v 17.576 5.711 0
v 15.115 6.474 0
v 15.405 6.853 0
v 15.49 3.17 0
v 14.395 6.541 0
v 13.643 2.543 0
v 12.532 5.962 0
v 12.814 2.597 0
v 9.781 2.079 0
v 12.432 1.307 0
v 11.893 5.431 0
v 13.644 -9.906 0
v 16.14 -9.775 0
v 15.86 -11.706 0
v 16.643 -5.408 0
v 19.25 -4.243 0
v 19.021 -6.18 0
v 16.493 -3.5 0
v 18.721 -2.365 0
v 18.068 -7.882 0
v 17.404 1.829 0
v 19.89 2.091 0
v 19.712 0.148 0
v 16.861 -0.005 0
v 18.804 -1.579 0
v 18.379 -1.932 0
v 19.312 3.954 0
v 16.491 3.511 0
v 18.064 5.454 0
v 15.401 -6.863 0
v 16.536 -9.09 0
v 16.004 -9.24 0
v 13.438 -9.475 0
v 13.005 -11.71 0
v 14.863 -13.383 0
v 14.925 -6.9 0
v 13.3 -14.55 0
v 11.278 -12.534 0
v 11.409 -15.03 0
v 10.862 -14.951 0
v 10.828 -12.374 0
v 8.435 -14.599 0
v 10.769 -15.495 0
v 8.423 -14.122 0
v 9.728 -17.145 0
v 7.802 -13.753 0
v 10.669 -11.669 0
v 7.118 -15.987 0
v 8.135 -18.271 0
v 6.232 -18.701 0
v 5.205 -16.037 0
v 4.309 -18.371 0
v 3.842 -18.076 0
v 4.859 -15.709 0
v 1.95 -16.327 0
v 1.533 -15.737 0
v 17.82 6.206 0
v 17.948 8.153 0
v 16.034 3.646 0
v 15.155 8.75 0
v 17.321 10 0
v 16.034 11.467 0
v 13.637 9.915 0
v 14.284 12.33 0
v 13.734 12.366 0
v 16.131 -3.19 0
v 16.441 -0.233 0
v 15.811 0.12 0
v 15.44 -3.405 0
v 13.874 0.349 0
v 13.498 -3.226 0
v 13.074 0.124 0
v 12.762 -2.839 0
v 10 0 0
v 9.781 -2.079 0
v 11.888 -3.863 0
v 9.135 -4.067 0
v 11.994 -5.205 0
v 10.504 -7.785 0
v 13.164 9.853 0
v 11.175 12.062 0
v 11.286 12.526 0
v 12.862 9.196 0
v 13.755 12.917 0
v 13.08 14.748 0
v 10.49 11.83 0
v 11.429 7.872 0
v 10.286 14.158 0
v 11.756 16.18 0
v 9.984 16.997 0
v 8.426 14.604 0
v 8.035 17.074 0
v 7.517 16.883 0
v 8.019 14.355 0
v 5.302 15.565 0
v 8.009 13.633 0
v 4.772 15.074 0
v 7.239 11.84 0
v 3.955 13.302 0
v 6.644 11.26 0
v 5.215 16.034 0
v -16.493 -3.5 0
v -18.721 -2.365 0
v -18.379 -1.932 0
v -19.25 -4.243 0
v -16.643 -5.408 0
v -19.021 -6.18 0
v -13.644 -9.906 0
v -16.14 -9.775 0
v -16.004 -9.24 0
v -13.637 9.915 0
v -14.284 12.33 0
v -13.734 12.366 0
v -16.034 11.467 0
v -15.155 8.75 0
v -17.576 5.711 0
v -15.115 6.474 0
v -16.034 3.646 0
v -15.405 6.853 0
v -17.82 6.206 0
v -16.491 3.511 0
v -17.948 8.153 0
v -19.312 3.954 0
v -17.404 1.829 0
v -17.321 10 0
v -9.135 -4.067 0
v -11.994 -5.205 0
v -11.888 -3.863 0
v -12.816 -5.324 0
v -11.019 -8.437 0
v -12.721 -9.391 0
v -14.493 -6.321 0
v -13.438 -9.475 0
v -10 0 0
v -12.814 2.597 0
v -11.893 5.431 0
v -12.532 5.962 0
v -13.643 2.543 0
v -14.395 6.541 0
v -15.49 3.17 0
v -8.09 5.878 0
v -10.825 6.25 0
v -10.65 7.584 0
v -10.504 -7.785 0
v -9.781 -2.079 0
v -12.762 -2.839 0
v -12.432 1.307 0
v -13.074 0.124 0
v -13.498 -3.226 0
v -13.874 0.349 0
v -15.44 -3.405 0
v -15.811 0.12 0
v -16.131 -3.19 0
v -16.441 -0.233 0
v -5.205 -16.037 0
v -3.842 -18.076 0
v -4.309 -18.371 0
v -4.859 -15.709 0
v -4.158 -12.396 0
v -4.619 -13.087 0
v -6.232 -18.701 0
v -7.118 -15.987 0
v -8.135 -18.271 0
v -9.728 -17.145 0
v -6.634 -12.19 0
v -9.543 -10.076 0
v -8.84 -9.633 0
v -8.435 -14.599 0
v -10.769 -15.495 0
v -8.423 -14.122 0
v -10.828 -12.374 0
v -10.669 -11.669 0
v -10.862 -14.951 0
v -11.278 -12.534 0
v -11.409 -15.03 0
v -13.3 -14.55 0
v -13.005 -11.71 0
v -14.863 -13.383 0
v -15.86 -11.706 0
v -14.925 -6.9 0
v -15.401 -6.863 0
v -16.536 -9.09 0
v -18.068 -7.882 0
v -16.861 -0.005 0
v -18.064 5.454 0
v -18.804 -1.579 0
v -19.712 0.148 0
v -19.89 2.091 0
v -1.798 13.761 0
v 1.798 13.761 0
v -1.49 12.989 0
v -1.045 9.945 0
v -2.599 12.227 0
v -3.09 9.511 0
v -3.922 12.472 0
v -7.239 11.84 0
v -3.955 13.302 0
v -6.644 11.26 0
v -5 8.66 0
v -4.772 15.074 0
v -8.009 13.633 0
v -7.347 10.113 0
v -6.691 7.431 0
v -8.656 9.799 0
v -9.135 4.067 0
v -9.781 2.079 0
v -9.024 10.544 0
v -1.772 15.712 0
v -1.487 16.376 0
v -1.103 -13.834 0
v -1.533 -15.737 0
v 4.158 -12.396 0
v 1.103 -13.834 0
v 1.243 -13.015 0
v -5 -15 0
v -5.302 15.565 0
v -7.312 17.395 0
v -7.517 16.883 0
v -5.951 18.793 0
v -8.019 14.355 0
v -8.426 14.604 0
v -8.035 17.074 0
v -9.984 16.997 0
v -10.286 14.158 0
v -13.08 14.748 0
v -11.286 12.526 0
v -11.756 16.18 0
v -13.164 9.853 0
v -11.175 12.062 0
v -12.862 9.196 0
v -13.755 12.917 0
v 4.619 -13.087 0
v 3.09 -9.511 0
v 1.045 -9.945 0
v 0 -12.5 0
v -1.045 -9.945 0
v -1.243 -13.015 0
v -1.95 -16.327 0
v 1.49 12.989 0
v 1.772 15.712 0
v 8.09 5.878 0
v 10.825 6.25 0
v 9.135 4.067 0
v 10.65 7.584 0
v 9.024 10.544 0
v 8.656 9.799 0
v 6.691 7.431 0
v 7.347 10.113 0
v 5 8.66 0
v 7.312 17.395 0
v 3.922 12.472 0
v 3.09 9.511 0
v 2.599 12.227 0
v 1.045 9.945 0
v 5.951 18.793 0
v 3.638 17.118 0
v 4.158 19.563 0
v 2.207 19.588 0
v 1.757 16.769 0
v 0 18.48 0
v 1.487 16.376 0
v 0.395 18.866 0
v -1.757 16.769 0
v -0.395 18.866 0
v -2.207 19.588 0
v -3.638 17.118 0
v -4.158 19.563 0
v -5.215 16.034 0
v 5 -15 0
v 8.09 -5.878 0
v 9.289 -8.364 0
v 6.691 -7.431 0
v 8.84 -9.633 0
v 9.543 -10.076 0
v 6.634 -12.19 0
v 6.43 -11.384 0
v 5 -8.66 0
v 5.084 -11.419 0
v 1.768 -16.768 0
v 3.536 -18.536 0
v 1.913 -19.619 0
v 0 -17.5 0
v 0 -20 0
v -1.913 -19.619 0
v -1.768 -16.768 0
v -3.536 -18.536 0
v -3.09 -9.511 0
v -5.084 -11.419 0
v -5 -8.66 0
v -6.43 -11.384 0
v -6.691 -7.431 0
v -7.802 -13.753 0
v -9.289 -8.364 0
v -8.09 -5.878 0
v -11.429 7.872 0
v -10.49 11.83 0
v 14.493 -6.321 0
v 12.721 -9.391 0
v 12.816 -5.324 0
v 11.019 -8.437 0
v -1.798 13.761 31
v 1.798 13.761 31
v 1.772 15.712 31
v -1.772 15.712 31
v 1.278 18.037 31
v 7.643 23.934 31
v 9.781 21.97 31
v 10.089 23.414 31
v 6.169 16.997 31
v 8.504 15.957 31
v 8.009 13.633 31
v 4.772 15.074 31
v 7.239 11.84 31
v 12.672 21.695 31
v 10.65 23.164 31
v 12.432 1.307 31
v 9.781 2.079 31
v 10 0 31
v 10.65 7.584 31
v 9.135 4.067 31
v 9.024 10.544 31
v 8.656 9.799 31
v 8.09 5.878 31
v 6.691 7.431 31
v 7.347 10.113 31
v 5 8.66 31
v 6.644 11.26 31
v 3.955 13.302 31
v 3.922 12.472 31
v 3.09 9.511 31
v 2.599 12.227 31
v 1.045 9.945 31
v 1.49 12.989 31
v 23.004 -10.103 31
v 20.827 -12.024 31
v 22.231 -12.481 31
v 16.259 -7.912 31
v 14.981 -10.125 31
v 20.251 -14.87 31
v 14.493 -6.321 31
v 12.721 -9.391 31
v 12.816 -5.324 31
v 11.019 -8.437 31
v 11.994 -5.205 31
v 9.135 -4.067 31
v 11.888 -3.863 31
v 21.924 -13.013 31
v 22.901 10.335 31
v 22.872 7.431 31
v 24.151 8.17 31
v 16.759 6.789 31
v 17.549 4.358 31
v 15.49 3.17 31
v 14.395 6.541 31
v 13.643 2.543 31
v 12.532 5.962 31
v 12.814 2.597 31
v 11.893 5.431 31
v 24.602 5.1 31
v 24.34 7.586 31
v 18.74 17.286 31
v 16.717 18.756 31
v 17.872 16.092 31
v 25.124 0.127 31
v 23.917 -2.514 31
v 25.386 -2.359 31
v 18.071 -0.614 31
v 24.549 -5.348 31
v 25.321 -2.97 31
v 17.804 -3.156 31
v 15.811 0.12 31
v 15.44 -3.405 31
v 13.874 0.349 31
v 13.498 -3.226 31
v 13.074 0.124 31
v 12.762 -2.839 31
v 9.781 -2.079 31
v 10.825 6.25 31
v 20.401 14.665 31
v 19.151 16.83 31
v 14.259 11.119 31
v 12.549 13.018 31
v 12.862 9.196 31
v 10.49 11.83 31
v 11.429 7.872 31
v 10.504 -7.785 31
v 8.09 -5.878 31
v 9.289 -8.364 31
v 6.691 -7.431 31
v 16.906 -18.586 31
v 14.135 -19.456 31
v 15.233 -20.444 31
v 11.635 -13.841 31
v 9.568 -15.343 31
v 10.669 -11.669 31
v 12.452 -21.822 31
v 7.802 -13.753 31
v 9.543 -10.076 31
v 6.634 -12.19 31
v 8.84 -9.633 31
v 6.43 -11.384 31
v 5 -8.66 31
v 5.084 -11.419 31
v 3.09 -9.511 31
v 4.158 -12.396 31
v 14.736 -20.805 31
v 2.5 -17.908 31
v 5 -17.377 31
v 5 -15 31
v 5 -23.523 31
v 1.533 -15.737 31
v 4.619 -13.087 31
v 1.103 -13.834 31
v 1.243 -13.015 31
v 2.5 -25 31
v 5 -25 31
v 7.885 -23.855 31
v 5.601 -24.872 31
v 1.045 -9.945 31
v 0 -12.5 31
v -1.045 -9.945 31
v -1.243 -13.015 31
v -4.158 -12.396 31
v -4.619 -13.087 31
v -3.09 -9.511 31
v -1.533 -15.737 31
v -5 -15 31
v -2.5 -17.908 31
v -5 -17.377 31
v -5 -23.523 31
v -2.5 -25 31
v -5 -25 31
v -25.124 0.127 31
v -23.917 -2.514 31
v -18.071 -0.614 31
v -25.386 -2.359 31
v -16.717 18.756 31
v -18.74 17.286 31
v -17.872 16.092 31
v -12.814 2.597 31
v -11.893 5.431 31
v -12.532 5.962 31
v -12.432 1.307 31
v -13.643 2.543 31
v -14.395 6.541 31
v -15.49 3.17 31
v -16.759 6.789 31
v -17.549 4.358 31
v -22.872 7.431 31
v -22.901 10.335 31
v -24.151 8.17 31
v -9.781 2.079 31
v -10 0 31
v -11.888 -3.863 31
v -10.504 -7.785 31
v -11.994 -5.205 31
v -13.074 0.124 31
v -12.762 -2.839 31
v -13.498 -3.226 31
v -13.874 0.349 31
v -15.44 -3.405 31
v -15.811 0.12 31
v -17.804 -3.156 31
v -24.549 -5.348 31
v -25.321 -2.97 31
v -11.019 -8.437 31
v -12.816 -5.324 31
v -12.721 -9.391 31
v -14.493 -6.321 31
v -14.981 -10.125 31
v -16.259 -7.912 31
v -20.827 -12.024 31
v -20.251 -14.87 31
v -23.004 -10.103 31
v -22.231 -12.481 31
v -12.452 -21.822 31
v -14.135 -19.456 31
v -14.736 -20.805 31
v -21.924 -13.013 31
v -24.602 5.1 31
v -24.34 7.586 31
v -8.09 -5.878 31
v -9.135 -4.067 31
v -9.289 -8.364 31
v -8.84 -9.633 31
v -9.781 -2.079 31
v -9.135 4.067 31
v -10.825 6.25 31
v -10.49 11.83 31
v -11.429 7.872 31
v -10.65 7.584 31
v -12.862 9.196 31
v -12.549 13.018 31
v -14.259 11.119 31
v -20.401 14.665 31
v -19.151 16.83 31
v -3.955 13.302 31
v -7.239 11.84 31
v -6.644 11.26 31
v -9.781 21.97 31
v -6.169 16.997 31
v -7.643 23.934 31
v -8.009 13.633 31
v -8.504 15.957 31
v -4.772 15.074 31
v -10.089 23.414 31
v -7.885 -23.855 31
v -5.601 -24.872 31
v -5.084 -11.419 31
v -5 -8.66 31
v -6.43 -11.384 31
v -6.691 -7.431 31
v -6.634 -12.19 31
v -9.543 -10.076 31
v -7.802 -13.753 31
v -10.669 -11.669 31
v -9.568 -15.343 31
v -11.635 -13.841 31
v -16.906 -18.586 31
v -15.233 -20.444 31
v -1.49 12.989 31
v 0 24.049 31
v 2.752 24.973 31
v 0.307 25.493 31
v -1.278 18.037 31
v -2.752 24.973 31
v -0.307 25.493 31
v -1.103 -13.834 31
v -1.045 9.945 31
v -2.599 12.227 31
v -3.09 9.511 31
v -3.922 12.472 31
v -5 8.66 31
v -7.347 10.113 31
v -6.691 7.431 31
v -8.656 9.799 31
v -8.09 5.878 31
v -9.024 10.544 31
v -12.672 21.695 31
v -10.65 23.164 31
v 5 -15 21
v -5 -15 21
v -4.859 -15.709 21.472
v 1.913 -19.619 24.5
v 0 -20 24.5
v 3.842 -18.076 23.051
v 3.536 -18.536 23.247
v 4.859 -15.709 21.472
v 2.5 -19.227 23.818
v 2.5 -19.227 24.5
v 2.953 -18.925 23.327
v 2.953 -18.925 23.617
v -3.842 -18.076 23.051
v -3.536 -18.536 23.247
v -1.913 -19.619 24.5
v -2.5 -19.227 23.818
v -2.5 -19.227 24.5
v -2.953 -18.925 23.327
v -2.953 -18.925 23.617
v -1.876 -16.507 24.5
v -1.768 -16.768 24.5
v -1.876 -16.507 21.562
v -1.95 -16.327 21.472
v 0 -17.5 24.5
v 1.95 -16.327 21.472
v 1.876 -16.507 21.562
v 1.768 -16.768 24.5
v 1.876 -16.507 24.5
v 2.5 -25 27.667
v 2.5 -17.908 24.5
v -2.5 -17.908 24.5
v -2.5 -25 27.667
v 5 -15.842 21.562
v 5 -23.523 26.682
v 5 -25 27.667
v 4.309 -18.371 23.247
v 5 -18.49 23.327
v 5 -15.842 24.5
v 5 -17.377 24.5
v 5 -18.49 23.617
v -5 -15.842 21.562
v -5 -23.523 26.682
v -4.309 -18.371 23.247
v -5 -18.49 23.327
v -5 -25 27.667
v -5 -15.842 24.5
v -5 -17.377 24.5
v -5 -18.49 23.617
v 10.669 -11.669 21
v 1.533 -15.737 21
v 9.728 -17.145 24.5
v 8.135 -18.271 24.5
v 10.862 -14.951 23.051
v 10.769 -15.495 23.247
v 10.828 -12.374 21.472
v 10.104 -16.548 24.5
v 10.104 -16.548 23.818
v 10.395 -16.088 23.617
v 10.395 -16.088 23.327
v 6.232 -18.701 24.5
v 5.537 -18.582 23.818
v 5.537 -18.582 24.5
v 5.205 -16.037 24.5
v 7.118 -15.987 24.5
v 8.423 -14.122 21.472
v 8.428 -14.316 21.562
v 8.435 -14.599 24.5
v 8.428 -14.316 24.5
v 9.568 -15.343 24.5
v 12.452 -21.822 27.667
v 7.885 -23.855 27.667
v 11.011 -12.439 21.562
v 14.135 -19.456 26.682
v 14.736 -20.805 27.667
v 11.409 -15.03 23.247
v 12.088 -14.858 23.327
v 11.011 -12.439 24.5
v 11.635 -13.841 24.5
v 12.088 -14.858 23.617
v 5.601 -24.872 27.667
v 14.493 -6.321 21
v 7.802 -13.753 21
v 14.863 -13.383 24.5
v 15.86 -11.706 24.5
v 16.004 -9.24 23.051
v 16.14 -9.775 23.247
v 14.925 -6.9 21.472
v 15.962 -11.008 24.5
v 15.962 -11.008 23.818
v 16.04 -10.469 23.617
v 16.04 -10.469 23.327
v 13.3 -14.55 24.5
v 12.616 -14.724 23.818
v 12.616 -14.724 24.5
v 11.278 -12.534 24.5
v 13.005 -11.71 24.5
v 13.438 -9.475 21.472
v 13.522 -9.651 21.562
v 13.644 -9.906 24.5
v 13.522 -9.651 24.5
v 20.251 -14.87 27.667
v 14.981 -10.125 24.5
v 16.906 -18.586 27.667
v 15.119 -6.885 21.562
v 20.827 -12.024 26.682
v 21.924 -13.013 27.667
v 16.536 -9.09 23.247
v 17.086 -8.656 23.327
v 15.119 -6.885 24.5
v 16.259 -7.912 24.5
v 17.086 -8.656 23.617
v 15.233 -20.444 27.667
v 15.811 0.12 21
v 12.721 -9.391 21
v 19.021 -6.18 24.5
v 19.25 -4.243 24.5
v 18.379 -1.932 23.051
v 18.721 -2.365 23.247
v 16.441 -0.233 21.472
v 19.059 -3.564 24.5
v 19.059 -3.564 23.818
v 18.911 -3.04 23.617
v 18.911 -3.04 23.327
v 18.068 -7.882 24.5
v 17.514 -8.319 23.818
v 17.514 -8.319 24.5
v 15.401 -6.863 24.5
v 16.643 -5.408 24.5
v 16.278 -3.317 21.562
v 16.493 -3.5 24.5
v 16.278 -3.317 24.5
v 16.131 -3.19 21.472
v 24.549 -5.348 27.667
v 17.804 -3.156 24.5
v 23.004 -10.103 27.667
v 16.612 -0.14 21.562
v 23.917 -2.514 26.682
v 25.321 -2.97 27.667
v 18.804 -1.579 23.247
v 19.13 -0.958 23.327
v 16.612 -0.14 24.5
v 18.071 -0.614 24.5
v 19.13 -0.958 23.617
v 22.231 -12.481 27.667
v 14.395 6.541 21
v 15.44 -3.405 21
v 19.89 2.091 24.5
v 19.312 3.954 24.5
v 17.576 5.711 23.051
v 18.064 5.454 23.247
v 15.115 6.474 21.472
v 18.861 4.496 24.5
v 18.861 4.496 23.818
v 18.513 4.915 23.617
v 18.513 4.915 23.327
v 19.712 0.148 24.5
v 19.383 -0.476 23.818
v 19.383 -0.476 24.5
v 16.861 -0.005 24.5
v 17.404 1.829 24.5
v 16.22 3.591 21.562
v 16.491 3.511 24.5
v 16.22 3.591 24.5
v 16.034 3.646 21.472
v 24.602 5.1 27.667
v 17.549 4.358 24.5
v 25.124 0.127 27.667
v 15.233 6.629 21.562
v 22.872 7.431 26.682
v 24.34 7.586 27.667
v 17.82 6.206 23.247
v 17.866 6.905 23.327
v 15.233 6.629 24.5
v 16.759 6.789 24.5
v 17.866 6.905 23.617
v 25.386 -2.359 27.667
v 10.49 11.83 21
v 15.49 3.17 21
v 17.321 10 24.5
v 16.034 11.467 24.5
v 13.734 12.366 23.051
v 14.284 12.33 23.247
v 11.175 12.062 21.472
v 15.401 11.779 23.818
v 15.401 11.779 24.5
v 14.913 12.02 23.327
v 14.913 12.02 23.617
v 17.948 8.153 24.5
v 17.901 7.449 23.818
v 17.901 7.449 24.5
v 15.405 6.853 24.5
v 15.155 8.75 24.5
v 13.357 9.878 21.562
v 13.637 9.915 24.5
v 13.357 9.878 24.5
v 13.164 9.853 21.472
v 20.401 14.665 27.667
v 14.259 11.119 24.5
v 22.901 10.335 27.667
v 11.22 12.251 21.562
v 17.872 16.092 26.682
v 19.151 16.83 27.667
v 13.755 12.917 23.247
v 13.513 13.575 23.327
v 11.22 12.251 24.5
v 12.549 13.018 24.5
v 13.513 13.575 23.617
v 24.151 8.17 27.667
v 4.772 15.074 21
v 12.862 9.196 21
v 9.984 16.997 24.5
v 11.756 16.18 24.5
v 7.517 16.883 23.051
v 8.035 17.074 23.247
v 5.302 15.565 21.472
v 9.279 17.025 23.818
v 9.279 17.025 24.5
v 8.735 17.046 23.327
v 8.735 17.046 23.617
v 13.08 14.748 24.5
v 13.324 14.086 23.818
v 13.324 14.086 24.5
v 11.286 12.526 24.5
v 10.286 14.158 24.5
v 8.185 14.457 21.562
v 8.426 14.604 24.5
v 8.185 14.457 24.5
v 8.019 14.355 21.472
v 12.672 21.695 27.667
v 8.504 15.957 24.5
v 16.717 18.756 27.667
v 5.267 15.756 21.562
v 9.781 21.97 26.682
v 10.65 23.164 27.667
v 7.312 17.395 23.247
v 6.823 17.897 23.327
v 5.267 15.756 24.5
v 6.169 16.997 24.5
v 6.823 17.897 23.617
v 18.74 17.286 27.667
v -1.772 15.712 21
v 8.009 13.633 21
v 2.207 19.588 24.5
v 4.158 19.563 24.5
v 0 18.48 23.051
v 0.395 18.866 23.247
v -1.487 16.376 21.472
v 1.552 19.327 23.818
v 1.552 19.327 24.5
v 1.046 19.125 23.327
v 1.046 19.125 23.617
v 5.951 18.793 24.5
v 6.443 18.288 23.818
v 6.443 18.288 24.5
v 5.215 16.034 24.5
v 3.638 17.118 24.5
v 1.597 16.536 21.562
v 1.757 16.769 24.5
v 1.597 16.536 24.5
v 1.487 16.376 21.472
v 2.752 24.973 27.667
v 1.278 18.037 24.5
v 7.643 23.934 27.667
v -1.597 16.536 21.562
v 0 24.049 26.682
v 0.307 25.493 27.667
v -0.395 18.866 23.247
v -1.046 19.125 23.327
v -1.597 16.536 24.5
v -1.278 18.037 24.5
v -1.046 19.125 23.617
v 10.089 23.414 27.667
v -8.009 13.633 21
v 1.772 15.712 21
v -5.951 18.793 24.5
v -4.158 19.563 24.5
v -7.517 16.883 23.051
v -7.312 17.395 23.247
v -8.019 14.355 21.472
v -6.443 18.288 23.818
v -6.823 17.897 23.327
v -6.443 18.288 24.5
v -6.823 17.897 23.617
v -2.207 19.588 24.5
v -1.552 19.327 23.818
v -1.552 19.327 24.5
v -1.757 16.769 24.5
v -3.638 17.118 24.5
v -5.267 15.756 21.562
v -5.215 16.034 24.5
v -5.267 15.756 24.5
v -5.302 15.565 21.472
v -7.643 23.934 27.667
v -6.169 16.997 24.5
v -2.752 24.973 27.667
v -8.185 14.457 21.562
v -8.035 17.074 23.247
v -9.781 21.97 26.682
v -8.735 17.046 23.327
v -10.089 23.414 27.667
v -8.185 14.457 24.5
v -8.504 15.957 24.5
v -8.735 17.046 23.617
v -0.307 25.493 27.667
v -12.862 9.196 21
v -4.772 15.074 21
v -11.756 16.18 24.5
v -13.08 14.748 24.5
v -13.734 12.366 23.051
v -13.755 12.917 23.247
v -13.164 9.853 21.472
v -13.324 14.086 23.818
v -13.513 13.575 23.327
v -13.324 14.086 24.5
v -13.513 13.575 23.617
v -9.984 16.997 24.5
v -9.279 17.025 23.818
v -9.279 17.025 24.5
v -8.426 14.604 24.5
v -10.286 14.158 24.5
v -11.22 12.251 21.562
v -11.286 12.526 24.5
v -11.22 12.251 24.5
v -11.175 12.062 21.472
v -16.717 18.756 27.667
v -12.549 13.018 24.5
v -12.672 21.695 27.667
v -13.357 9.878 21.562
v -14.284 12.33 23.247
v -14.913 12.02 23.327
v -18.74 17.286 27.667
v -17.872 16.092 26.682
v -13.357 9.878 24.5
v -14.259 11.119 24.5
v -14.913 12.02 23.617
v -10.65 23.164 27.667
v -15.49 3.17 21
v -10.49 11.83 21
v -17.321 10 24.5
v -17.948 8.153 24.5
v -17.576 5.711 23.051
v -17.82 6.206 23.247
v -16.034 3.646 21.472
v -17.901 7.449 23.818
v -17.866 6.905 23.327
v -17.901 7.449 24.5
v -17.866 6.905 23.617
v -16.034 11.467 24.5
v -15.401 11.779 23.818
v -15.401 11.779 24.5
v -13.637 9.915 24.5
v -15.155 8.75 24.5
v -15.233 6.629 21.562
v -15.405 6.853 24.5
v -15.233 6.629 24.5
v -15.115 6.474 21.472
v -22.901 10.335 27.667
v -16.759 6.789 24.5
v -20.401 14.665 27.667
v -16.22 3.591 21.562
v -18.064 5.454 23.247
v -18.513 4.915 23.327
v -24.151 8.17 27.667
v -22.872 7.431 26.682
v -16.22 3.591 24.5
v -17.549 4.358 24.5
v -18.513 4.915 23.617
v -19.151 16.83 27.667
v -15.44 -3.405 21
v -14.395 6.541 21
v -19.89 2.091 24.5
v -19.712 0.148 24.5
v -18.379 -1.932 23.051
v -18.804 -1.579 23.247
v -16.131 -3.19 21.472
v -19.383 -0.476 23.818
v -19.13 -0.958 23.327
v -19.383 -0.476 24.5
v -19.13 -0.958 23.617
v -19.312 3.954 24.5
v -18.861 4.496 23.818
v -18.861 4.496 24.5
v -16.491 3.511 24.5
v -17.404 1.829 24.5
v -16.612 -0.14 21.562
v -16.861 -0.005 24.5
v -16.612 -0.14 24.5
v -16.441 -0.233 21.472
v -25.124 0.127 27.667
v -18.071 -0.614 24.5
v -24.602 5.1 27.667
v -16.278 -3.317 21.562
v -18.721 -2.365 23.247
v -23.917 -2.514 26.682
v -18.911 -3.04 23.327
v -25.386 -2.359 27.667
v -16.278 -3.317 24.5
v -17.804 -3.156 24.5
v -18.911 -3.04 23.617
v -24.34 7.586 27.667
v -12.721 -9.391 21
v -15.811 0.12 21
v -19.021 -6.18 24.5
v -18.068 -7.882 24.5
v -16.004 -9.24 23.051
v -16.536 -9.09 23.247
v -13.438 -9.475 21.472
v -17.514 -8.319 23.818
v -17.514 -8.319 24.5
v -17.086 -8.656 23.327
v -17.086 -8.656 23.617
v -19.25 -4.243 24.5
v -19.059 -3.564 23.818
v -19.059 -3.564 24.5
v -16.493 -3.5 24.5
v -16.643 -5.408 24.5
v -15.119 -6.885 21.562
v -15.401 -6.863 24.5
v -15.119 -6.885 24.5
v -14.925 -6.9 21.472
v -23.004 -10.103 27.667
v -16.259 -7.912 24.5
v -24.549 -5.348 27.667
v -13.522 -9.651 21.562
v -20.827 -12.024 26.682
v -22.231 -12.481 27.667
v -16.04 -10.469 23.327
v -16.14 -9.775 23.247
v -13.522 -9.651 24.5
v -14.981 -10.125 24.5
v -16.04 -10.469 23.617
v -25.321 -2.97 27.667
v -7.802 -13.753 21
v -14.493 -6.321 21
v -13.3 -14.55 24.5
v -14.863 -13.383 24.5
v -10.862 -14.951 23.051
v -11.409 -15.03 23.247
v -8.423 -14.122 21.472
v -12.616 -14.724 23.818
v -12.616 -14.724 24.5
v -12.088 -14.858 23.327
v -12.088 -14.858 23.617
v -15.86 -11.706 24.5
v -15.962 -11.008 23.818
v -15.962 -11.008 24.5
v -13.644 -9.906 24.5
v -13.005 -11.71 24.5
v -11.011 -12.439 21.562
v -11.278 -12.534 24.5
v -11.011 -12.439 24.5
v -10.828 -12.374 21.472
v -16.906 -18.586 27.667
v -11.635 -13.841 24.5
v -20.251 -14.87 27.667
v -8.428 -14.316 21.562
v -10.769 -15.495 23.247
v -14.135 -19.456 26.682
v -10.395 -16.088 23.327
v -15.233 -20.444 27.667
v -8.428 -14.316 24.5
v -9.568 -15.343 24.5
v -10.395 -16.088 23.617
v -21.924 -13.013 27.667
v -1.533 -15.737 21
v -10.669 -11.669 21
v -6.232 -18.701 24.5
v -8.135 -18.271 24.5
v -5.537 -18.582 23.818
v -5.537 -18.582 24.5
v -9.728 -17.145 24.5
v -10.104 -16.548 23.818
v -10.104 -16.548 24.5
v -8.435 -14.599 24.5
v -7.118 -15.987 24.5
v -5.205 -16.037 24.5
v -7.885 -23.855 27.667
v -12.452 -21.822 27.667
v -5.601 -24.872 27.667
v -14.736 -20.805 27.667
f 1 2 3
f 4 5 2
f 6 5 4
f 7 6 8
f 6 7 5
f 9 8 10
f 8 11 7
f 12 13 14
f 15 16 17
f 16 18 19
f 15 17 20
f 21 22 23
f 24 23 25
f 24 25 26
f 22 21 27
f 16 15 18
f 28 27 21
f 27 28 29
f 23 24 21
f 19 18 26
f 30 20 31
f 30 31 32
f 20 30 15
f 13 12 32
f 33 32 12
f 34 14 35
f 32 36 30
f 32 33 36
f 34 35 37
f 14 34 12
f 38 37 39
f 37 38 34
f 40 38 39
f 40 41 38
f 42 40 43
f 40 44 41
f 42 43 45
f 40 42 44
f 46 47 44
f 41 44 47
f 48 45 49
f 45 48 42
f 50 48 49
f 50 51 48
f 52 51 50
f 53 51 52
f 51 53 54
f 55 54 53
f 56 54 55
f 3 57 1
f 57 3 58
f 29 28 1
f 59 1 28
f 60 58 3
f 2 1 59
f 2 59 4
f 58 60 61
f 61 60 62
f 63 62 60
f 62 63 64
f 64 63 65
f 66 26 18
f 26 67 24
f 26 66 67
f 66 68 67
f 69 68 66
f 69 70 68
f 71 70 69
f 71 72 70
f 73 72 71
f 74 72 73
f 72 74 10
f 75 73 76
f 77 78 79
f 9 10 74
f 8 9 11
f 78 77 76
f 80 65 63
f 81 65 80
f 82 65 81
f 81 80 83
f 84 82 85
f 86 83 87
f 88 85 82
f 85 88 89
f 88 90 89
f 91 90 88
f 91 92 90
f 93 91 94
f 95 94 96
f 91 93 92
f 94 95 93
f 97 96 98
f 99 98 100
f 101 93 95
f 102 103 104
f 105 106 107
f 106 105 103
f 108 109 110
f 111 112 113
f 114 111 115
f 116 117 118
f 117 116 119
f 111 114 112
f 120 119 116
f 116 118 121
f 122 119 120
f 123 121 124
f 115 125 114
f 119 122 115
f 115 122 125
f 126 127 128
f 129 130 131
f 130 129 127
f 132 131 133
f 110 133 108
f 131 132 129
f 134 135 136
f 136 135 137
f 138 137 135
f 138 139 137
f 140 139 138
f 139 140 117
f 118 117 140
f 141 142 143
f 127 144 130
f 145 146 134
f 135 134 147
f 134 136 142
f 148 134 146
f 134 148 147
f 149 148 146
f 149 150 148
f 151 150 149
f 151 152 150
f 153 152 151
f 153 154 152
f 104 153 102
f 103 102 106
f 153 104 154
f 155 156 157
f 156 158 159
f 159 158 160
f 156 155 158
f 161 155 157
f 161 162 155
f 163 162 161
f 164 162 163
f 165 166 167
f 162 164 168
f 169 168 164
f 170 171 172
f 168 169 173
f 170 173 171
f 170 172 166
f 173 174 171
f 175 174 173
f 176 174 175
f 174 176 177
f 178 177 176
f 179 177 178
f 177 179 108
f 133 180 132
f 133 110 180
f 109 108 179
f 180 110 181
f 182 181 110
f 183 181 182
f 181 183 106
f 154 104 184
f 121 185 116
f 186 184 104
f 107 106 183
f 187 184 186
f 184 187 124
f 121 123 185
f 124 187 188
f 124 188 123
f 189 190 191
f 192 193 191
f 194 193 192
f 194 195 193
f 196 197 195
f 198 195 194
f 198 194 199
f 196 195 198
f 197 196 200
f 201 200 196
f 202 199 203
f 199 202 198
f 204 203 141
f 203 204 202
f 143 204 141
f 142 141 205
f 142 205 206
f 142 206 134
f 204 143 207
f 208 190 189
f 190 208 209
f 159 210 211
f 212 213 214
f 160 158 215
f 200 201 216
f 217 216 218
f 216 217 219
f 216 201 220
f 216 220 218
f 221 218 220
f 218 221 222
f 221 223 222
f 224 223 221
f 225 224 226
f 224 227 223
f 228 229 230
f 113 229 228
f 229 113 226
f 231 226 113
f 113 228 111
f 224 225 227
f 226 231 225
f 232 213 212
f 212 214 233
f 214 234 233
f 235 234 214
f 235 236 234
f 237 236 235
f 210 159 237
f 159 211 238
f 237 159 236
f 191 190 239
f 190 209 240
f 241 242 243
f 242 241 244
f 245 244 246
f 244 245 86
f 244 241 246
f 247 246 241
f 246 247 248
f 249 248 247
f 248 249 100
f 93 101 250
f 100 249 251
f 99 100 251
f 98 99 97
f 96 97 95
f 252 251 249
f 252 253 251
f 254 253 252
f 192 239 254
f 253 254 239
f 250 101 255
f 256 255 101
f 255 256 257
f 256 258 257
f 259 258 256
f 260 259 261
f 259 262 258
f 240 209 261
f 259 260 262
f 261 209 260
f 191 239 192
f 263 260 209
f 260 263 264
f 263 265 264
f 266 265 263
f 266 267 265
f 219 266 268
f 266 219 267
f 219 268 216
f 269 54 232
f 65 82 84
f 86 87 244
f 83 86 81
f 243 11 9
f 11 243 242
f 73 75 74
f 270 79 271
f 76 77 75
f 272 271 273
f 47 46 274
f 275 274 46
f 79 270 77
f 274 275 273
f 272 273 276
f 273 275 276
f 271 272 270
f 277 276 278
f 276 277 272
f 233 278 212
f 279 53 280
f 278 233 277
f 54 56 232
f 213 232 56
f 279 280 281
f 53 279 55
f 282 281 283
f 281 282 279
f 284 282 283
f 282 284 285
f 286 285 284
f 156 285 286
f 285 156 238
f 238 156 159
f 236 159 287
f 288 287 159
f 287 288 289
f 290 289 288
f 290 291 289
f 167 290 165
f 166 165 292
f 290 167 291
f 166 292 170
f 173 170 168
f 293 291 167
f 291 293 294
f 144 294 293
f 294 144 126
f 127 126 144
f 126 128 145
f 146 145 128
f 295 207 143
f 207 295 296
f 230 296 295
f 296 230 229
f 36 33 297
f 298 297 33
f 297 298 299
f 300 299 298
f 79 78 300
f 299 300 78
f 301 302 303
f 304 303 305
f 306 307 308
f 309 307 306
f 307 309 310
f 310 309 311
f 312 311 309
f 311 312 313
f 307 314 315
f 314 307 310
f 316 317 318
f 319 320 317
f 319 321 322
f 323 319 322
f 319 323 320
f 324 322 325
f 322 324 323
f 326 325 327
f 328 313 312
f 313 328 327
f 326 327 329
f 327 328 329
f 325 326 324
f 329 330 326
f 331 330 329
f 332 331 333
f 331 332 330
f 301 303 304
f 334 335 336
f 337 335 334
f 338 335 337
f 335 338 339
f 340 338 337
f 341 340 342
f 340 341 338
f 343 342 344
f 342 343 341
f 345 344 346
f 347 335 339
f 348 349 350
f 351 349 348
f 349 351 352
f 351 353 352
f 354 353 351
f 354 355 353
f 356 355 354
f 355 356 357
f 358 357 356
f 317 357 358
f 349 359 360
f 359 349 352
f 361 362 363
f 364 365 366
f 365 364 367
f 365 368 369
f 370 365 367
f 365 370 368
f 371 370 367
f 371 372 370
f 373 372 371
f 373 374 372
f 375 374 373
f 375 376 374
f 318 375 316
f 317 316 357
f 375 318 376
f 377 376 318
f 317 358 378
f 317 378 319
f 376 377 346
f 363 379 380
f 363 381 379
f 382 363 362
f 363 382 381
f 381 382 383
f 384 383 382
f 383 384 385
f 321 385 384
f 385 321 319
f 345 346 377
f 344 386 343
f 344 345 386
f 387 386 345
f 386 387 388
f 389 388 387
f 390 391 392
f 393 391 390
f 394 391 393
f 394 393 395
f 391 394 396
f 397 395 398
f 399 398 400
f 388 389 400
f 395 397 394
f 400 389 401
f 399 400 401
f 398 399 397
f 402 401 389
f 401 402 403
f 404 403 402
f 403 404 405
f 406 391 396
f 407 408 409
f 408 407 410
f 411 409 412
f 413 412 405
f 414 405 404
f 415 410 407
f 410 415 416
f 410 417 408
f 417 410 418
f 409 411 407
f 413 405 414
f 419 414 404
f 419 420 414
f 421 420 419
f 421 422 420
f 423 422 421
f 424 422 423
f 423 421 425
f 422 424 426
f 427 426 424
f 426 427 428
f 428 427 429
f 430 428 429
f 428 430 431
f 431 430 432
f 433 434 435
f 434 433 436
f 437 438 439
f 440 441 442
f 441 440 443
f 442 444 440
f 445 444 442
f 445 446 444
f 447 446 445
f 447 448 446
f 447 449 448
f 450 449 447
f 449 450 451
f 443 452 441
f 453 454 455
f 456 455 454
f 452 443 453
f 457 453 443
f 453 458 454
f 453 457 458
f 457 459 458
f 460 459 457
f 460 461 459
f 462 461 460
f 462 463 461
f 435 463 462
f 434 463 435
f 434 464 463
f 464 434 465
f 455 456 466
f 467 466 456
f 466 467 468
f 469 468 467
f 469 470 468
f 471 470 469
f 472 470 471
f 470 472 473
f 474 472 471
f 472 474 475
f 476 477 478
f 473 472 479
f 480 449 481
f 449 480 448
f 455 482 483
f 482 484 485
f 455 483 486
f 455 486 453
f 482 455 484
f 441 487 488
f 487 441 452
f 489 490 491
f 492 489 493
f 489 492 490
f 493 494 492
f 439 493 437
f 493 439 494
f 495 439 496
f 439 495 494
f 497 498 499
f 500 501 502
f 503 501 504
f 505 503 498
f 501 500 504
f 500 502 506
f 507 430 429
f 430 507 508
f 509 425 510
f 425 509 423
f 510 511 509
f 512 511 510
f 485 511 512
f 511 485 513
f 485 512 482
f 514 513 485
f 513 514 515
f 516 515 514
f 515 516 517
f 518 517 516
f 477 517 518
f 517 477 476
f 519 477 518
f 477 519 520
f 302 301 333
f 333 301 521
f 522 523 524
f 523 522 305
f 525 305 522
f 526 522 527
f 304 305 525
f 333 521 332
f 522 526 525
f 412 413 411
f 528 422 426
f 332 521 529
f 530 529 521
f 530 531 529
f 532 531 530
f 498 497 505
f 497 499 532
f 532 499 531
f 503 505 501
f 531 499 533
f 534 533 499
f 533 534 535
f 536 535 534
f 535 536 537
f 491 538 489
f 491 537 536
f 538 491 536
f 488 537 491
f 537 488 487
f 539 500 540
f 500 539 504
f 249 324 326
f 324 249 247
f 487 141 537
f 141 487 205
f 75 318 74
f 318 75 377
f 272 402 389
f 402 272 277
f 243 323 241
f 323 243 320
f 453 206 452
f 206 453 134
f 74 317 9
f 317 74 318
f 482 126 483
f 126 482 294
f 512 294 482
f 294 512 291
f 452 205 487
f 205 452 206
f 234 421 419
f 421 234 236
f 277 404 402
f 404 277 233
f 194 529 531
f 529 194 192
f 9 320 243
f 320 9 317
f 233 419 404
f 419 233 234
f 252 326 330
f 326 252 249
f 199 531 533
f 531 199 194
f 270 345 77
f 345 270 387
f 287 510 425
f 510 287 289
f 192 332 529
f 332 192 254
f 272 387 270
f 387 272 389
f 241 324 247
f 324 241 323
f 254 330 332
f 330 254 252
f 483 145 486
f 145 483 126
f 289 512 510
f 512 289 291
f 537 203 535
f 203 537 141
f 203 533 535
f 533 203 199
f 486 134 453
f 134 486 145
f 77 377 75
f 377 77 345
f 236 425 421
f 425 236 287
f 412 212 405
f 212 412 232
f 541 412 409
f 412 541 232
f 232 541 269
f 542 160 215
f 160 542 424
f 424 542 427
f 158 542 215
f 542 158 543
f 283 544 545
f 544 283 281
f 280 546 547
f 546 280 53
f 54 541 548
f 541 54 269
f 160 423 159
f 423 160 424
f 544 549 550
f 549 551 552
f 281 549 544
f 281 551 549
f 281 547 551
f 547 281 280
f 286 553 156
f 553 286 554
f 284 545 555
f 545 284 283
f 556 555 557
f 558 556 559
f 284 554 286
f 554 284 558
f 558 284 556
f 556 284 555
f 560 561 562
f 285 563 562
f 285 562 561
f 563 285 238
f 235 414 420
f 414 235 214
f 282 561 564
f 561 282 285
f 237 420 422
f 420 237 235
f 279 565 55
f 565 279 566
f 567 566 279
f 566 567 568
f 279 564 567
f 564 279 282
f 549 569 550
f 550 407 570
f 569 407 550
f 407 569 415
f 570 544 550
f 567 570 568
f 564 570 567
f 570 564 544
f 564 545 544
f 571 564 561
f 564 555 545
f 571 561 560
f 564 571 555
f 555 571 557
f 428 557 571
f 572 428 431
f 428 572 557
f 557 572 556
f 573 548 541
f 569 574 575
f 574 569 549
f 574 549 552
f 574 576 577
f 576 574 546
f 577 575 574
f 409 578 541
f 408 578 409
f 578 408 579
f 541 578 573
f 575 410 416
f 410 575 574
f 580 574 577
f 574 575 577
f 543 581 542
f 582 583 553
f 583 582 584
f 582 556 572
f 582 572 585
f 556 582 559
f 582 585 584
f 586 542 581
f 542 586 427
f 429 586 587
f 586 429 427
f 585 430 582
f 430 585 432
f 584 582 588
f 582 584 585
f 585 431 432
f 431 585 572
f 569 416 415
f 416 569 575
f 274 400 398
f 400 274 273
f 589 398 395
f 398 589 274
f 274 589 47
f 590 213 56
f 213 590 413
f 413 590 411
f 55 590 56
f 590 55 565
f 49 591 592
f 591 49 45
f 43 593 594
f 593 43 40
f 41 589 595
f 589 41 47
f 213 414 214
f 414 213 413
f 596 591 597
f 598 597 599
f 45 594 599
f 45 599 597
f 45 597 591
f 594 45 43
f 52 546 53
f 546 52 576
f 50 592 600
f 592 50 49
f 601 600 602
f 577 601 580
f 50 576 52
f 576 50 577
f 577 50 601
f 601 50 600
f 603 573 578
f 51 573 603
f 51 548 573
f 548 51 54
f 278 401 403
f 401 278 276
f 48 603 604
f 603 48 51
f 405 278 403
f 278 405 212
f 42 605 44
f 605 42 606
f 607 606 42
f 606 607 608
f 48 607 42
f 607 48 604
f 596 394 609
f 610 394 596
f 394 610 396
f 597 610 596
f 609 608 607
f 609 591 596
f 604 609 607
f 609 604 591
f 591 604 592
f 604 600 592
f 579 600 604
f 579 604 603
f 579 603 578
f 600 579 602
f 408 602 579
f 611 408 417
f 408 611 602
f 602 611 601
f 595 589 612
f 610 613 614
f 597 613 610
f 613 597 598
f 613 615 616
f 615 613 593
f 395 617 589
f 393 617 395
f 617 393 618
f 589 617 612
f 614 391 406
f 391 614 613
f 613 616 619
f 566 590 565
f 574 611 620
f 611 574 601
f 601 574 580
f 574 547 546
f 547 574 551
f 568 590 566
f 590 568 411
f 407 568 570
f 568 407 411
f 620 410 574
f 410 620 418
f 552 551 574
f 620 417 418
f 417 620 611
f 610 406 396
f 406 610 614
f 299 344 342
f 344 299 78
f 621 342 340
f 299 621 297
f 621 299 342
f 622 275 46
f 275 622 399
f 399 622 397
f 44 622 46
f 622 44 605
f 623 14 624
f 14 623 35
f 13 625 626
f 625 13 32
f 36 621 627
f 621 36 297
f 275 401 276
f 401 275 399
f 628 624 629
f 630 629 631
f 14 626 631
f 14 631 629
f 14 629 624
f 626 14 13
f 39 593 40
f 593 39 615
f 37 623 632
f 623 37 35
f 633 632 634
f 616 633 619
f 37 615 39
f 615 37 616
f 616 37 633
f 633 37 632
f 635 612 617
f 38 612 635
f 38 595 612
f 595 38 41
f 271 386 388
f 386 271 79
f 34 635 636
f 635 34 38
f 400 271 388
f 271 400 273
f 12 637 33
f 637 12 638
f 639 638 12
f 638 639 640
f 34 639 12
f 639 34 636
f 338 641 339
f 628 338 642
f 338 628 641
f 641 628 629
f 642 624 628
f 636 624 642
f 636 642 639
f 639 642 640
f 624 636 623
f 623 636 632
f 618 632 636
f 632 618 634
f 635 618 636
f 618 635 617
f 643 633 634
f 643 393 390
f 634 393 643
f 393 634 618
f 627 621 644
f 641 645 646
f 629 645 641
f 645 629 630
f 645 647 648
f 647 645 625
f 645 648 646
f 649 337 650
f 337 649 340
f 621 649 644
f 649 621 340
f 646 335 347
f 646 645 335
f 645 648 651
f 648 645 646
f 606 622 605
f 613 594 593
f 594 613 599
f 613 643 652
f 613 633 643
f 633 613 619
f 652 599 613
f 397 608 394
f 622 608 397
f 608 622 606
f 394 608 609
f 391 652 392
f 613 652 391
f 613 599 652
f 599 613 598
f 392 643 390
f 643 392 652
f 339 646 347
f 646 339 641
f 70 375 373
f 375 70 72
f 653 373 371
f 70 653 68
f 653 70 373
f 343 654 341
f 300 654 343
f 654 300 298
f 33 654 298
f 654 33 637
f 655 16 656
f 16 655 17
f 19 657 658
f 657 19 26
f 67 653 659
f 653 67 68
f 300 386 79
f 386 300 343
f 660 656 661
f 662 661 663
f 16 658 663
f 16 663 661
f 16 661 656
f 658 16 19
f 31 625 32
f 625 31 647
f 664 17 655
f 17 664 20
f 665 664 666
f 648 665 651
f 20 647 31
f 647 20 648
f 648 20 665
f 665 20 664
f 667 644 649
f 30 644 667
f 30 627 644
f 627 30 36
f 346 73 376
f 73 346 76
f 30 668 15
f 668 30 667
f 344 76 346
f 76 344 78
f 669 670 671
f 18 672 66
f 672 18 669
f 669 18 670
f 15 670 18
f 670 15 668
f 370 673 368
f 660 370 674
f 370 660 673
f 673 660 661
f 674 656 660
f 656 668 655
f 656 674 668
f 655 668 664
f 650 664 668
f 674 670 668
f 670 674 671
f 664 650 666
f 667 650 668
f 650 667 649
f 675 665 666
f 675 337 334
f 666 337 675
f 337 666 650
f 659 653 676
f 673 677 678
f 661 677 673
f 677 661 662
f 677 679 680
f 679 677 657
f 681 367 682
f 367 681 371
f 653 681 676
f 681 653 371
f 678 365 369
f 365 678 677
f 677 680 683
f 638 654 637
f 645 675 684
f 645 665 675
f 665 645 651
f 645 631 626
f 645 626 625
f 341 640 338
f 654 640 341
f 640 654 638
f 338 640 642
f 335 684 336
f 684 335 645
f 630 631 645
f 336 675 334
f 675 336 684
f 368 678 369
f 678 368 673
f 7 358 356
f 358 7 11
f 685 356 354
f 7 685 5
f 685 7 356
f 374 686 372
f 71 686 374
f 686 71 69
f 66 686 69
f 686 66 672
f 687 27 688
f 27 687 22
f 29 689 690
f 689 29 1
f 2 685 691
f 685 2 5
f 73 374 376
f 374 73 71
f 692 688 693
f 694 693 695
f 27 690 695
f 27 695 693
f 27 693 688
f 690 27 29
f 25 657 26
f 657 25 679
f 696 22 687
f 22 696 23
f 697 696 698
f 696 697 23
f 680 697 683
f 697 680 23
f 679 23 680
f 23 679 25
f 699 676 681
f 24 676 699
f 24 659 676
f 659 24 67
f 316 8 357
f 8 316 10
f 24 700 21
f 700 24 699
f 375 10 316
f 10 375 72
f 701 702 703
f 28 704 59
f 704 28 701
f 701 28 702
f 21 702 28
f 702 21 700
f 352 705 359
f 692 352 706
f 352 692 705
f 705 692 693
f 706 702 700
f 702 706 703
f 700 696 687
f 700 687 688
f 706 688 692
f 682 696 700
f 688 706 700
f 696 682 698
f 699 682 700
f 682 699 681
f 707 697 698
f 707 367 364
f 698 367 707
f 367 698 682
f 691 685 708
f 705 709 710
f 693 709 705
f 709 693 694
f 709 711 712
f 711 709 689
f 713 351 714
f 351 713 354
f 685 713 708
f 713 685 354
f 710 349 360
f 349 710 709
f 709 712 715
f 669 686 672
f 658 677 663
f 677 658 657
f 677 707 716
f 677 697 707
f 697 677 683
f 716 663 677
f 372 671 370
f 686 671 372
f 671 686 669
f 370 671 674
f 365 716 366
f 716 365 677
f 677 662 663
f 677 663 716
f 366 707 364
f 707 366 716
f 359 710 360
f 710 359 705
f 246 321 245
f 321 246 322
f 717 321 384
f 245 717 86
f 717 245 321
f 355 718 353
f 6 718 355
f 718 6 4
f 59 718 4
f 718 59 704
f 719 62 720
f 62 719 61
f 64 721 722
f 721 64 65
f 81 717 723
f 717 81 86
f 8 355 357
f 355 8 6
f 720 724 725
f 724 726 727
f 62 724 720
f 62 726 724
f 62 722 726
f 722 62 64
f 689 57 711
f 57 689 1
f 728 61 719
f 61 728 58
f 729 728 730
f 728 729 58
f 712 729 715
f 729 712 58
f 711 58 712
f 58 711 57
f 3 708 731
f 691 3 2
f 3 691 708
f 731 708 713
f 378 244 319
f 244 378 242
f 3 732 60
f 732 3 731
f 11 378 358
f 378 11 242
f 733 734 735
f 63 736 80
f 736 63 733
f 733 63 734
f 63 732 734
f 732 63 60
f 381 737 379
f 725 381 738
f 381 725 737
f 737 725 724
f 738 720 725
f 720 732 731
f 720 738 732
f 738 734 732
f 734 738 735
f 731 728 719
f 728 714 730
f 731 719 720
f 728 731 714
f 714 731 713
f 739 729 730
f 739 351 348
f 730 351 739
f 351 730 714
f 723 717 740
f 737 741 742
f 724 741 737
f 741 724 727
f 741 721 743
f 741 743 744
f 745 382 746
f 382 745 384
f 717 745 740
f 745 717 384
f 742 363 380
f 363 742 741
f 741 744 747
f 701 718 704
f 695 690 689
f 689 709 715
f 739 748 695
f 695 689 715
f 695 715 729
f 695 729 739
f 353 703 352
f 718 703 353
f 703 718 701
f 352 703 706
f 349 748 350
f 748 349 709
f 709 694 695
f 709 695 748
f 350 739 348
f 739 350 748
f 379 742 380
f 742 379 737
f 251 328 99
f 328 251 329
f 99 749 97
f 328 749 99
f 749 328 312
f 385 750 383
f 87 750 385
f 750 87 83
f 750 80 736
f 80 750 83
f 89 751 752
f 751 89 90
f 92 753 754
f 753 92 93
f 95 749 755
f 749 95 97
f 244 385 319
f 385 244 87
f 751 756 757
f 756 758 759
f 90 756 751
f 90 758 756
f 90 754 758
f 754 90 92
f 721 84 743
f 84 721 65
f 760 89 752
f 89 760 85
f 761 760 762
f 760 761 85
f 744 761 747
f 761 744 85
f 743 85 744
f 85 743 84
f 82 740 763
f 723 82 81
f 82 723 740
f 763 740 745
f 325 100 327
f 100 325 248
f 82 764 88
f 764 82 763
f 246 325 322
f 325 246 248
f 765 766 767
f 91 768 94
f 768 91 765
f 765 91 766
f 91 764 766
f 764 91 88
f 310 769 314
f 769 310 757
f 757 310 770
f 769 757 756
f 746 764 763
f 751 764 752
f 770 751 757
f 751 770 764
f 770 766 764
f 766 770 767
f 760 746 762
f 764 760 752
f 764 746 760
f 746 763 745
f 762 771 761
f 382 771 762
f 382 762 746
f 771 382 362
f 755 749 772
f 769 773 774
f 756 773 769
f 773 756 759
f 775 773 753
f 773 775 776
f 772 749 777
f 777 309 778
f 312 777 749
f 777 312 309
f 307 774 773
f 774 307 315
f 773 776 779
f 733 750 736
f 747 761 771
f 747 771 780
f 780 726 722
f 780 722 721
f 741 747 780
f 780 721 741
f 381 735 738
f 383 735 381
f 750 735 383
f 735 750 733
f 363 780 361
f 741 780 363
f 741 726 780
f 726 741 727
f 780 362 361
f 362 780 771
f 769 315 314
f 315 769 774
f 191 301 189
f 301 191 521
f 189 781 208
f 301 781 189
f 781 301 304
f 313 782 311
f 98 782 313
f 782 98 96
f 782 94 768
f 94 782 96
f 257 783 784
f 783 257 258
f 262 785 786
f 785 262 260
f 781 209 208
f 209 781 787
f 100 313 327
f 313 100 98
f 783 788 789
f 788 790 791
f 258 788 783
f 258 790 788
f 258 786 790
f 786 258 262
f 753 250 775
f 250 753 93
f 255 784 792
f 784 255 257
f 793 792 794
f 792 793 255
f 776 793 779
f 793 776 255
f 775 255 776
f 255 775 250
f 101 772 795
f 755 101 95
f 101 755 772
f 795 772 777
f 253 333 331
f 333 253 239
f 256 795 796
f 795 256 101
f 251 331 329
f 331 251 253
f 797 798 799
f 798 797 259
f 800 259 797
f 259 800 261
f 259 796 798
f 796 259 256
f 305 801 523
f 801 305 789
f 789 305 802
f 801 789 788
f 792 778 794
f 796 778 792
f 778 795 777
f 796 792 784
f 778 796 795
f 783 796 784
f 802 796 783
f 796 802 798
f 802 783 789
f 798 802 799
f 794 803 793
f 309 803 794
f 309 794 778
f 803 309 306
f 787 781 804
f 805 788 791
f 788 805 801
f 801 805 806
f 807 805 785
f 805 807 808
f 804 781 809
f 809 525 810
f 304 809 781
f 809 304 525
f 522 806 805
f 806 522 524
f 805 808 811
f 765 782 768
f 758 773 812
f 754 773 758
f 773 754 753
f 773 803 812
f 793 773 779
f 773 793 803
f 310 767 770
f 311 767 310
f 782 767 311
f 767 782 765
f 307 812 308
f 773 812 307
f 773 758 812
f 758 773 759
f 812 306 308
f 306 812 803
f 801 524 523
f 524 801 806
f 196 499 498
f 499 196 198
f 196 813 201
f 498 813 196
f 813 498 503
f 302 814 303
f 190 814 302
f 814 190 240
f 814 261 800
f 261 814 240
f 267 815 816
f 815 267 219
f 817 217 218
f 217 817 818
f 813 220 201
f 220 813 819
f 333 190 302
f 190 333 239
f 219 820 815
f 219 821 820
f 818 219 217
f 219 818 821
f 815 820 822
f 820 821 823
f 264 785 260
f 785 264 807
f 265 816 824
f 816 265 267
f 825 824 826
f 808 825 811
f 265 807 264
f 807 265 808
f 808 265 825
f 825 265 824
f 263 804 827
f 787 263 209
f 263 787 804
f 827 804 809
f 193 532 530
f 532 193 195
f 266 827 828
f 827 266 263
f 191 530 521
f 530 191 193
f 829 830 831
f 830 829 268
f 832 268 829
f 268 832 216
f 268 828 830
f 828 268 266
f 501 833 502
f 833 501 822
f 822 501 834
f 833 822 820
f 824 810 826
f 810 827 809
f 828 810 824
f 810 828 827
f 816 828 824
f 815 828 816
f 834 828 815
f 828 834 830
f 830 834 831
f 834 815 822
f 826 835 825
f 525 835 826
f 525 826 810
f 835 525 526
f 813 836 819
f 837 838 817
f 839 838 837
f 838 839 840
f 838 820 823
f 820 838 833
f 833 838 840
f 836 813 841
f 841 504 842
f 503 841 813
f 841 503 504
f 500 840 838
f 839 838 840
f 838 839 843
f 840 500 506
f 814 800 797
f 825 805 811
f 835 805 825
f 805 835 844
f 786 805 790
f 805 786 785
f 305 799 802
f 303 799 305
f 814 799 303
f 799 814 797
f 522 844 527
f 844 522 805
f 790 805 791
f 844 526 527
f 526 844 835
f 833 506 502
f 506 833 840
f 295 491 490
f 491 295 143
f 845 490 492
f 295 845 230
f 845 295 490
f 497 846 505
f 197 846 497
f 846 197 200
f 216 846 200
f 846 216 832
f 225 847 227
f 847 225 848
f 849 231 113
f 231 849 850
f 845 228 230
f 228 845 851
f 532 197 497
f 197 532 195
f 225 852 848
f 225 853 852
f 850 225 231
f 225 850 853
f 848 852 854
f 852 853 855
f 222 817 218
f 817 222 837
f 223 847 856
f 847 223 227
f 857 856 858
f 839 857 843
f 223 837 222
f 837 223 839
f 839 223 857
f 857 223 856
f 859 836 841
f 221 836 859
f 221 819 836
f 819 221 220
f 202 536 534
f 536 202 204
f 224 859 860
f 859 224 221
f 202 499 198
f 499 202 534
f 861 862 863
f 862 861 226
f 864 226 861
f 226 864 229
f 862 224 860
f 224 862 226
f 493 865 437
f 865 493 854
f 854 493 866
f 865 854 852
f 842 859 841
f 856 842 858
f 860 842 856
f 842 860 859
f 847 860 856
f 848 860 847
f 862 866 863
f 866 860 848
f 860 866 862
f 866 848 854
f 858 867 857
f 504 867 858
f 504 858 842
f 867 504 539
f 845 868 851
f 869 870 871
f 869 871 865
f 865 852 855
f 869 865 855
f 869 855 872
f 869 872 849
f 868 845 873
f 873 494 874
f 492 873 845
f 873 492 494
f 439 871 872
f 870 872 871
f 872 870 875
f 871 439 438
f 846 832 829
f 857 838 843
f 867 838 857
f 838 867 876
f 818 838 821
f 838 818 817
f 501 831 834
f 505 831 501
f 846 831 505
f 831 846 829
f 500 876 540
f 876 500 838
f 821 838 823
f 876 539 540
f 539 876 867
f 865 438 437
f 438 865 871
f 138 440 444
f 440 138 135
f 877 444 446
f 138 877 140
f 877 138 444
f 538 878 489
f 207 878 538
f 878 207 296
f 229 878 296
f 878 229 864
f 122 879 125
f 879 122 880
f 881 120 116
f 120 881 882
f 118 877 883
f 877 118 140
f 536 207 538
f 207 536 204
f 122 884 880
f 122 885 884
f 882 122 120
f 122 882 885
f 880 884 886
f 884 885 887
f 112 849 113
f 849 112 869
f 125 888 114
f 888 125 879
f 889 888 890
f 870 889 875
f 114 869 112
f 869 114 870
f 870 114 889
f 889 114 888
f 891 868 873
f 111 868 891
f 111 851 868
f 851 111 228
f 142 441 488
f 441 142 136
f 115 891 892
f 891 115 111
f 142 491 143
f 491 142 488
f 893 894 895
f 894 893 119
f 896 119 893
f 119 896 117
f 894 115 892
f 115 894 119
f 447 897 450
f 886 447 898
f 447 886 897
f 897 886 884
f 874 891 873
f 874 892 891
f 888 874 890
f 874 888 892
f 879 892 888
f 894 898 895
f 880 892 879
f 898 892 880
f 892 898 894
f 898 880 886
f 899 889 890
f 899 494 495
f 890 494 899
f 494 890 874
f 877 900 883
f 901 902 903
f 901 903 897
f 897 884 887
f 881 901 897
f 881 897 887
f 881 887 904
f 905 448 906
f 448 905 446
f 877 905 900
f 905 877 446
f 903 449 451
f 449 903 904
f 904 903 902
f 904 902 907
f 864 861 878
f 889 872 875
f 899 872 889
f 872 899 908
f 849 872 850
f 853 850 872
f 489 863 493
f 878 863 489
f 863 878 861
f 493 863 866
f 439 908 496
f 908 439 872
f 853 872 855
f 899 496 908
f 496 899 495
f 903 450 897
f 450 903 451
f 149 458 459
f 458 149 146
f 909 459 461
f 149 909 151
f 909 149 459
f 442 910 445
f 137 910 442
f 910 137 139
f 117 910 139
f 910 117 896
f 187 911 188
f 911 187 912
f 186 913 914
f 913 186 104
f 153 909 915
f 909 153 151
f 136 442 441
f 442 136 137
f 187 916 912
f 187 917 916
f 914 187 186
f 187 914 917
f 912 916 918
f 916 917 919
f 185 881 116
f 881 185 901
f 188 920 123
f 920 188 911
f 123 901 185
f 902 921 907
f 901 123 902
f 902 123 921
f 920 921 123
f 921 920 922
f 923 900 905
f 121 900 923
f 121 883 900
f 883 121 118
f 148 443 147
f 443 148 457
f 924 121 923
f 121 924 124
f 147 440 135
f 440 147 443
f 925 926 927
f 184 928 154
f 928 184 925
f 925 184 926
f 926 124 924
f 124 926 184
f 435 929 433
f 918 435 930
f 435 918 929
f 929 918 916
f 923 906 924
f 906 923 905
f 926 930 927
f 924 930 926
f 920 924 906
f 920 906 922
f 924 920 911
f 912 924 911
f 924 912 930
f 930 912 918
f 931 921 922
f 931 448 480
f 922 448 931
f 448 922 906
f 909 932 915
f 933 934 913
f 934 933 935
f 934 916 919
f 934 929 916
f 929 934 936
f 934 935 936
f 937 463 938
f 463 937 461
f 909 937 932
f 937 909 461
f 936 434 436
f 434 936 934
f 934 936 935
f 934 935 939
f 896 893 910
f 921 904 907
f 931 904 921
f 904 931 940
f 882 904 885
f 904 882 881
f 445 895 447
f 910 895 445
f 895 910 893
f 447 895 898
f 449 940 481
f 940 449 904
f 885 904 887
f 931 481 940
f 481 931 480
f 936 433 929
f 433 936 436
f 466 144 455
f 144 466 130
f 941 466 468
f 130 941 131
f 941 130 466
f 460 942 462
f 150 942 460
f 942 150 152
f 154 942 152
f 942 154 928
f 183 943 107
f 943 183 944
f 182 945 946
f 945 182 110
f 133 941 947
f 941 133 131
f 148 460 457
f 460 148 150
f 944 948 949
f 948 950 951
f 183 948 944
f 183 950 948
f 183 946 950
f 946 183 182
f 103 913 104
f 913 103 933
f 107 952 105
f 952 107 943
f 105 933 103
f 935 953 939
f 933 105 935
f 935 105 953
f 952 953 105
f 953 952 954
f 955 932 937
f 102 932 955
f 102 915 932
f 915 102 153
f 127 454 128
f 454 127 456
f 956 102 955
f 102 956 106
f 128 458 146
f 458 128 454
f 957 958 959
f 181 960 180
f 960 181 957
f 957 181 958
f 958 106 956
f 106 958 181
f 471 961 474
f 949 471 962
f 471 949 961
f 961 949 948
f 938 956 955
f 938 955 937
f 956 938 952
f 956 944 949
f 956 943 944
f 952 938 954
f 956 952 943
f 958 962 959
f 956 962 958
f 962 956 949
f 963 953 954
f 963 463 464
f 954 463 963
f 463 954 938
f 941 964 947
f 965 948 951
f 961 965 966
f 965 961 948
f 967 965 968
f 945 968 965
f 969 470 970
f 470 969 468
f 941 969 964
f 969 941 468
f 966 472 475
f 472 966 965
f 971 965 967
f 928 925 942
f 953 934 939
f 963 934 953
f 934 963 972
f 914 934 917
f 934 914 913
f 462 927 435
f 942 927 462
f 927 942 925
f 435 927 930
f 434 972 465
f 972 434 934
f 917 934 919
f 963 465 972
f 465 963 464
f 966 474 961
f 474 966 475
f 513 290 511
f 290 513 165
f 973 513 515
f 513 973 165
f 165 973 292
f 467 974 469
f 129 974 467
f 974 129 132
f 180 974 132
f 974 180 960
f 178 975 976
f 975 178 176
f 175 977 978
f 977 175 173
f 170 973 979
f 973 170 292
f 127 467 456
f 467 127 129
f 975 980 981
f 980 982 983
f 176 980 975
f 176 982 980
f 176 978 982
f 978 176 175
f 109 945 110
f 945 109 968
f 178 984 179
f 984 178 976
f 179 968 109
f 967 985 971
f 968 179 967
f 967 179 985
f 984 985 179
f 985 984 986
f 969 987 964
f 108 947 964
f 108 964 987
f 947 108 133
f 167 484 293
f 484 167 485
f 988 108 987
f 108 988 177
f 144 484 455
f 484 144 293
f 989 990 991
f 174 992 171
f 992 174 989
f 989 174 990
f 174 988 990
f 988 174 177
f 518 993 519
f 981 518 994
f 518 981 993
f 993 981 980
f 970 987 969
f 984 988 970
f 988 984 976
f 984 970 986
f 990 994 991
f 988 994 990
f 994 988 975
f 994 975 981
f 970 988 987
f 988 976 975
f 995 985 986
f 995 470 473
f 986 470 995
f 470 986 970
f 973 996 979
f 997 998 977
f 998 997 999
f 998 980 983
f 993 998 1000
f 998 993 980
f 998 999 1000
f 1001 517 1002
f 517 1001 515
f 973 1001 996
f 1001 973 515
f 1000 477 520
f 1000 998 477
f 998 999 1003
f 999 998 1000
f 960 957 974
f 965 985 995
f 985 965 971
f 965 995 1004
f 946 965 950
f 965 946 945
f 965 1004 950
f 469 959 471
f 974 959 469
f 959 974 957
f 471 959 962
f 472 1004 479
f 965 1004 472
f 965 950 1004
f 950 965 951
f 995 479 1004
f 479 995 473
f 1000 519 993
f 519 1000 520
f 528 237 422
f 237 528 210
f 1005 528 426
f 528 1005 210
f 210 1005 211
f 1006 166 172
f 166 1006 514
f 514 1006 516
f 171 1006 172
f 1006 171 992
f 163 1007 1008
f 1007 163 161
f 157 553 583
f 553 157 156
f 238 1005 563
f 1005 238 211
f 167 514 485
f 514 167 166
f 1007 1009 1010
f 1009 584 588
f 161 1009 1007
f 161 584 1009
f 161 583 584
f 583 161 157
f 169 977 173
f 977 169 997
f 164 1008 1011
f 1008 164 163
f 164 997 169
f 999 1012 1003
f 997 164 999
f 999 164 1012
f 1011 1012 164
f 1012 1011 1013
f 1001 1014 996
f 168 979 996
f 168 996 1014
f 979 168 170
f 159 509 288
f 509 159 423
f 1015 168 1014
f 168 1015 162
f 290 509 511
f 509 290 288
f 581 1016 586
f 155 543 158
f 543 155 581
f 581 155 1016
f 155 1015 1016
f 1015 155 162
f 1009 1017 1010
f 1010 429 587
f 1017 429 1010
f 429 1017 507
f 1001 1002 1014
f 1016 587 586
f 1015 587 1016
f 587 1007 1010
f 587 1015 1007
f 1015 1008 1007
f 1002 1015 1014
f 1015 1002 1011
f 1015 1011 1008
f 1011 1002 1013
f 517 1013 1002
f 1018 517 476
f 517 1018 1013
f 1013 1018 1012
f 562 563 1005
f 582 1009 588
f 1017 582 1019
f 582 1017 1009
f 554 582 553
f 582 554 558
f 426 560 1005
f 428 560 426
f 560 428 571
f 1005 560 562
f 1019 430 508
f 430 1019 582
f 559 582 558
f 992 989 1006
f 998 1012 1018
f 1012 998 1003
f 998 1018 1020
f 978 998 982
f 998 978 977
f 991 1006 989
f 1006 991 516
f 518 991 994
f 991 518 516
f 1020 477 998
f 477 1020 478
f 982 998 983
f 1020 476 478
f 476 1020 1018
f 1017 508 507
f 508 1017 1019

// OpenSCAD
// Количество веток
count=15;

difference(){
	cylinder(h=31,r=12.5);
	cylinder(h=31,r=10);
}

for (i=[0:count]){
	rotate([0,0,360/count*i]){
		translate([0, -15, 0]){
			branch ();
		}
	}
}

// Держатель для ветки
module branch (){
	union(){
		difference(){
			cylinder(h=31,r=5);
			cylinder(h=31,r=2.5);
			translate([-2.5, -5, 31-6.5]){
				cube([5,5,6.5]);
			}
		}
		translate([5, -15, 31]){
			rotate([0,180,0]){
				
				difference(){
					union(){
		   			prism(2.5, 15, 10);
						translate([7.5, 0, 0]){
		   				prism(2.5, 15, 10);
						}					
					}
					translate([0, -5, 0]){
	   				cube([10, 10, 10]);
					}
				}
			}
		}
	}
}

// Создание призмы (для направляющих ветки)
module prism(l, w, h){
	polyhedron(
		points=[[0,0,0], [l,0,0], [l,w,0], [0,w,0], [0,w,h], [l,w,h]],
		faces=[[0,1,2,3],[5,4,3,2],[0,4,5,1],[0,3,4],[5,2,1]]
	);
}
   
